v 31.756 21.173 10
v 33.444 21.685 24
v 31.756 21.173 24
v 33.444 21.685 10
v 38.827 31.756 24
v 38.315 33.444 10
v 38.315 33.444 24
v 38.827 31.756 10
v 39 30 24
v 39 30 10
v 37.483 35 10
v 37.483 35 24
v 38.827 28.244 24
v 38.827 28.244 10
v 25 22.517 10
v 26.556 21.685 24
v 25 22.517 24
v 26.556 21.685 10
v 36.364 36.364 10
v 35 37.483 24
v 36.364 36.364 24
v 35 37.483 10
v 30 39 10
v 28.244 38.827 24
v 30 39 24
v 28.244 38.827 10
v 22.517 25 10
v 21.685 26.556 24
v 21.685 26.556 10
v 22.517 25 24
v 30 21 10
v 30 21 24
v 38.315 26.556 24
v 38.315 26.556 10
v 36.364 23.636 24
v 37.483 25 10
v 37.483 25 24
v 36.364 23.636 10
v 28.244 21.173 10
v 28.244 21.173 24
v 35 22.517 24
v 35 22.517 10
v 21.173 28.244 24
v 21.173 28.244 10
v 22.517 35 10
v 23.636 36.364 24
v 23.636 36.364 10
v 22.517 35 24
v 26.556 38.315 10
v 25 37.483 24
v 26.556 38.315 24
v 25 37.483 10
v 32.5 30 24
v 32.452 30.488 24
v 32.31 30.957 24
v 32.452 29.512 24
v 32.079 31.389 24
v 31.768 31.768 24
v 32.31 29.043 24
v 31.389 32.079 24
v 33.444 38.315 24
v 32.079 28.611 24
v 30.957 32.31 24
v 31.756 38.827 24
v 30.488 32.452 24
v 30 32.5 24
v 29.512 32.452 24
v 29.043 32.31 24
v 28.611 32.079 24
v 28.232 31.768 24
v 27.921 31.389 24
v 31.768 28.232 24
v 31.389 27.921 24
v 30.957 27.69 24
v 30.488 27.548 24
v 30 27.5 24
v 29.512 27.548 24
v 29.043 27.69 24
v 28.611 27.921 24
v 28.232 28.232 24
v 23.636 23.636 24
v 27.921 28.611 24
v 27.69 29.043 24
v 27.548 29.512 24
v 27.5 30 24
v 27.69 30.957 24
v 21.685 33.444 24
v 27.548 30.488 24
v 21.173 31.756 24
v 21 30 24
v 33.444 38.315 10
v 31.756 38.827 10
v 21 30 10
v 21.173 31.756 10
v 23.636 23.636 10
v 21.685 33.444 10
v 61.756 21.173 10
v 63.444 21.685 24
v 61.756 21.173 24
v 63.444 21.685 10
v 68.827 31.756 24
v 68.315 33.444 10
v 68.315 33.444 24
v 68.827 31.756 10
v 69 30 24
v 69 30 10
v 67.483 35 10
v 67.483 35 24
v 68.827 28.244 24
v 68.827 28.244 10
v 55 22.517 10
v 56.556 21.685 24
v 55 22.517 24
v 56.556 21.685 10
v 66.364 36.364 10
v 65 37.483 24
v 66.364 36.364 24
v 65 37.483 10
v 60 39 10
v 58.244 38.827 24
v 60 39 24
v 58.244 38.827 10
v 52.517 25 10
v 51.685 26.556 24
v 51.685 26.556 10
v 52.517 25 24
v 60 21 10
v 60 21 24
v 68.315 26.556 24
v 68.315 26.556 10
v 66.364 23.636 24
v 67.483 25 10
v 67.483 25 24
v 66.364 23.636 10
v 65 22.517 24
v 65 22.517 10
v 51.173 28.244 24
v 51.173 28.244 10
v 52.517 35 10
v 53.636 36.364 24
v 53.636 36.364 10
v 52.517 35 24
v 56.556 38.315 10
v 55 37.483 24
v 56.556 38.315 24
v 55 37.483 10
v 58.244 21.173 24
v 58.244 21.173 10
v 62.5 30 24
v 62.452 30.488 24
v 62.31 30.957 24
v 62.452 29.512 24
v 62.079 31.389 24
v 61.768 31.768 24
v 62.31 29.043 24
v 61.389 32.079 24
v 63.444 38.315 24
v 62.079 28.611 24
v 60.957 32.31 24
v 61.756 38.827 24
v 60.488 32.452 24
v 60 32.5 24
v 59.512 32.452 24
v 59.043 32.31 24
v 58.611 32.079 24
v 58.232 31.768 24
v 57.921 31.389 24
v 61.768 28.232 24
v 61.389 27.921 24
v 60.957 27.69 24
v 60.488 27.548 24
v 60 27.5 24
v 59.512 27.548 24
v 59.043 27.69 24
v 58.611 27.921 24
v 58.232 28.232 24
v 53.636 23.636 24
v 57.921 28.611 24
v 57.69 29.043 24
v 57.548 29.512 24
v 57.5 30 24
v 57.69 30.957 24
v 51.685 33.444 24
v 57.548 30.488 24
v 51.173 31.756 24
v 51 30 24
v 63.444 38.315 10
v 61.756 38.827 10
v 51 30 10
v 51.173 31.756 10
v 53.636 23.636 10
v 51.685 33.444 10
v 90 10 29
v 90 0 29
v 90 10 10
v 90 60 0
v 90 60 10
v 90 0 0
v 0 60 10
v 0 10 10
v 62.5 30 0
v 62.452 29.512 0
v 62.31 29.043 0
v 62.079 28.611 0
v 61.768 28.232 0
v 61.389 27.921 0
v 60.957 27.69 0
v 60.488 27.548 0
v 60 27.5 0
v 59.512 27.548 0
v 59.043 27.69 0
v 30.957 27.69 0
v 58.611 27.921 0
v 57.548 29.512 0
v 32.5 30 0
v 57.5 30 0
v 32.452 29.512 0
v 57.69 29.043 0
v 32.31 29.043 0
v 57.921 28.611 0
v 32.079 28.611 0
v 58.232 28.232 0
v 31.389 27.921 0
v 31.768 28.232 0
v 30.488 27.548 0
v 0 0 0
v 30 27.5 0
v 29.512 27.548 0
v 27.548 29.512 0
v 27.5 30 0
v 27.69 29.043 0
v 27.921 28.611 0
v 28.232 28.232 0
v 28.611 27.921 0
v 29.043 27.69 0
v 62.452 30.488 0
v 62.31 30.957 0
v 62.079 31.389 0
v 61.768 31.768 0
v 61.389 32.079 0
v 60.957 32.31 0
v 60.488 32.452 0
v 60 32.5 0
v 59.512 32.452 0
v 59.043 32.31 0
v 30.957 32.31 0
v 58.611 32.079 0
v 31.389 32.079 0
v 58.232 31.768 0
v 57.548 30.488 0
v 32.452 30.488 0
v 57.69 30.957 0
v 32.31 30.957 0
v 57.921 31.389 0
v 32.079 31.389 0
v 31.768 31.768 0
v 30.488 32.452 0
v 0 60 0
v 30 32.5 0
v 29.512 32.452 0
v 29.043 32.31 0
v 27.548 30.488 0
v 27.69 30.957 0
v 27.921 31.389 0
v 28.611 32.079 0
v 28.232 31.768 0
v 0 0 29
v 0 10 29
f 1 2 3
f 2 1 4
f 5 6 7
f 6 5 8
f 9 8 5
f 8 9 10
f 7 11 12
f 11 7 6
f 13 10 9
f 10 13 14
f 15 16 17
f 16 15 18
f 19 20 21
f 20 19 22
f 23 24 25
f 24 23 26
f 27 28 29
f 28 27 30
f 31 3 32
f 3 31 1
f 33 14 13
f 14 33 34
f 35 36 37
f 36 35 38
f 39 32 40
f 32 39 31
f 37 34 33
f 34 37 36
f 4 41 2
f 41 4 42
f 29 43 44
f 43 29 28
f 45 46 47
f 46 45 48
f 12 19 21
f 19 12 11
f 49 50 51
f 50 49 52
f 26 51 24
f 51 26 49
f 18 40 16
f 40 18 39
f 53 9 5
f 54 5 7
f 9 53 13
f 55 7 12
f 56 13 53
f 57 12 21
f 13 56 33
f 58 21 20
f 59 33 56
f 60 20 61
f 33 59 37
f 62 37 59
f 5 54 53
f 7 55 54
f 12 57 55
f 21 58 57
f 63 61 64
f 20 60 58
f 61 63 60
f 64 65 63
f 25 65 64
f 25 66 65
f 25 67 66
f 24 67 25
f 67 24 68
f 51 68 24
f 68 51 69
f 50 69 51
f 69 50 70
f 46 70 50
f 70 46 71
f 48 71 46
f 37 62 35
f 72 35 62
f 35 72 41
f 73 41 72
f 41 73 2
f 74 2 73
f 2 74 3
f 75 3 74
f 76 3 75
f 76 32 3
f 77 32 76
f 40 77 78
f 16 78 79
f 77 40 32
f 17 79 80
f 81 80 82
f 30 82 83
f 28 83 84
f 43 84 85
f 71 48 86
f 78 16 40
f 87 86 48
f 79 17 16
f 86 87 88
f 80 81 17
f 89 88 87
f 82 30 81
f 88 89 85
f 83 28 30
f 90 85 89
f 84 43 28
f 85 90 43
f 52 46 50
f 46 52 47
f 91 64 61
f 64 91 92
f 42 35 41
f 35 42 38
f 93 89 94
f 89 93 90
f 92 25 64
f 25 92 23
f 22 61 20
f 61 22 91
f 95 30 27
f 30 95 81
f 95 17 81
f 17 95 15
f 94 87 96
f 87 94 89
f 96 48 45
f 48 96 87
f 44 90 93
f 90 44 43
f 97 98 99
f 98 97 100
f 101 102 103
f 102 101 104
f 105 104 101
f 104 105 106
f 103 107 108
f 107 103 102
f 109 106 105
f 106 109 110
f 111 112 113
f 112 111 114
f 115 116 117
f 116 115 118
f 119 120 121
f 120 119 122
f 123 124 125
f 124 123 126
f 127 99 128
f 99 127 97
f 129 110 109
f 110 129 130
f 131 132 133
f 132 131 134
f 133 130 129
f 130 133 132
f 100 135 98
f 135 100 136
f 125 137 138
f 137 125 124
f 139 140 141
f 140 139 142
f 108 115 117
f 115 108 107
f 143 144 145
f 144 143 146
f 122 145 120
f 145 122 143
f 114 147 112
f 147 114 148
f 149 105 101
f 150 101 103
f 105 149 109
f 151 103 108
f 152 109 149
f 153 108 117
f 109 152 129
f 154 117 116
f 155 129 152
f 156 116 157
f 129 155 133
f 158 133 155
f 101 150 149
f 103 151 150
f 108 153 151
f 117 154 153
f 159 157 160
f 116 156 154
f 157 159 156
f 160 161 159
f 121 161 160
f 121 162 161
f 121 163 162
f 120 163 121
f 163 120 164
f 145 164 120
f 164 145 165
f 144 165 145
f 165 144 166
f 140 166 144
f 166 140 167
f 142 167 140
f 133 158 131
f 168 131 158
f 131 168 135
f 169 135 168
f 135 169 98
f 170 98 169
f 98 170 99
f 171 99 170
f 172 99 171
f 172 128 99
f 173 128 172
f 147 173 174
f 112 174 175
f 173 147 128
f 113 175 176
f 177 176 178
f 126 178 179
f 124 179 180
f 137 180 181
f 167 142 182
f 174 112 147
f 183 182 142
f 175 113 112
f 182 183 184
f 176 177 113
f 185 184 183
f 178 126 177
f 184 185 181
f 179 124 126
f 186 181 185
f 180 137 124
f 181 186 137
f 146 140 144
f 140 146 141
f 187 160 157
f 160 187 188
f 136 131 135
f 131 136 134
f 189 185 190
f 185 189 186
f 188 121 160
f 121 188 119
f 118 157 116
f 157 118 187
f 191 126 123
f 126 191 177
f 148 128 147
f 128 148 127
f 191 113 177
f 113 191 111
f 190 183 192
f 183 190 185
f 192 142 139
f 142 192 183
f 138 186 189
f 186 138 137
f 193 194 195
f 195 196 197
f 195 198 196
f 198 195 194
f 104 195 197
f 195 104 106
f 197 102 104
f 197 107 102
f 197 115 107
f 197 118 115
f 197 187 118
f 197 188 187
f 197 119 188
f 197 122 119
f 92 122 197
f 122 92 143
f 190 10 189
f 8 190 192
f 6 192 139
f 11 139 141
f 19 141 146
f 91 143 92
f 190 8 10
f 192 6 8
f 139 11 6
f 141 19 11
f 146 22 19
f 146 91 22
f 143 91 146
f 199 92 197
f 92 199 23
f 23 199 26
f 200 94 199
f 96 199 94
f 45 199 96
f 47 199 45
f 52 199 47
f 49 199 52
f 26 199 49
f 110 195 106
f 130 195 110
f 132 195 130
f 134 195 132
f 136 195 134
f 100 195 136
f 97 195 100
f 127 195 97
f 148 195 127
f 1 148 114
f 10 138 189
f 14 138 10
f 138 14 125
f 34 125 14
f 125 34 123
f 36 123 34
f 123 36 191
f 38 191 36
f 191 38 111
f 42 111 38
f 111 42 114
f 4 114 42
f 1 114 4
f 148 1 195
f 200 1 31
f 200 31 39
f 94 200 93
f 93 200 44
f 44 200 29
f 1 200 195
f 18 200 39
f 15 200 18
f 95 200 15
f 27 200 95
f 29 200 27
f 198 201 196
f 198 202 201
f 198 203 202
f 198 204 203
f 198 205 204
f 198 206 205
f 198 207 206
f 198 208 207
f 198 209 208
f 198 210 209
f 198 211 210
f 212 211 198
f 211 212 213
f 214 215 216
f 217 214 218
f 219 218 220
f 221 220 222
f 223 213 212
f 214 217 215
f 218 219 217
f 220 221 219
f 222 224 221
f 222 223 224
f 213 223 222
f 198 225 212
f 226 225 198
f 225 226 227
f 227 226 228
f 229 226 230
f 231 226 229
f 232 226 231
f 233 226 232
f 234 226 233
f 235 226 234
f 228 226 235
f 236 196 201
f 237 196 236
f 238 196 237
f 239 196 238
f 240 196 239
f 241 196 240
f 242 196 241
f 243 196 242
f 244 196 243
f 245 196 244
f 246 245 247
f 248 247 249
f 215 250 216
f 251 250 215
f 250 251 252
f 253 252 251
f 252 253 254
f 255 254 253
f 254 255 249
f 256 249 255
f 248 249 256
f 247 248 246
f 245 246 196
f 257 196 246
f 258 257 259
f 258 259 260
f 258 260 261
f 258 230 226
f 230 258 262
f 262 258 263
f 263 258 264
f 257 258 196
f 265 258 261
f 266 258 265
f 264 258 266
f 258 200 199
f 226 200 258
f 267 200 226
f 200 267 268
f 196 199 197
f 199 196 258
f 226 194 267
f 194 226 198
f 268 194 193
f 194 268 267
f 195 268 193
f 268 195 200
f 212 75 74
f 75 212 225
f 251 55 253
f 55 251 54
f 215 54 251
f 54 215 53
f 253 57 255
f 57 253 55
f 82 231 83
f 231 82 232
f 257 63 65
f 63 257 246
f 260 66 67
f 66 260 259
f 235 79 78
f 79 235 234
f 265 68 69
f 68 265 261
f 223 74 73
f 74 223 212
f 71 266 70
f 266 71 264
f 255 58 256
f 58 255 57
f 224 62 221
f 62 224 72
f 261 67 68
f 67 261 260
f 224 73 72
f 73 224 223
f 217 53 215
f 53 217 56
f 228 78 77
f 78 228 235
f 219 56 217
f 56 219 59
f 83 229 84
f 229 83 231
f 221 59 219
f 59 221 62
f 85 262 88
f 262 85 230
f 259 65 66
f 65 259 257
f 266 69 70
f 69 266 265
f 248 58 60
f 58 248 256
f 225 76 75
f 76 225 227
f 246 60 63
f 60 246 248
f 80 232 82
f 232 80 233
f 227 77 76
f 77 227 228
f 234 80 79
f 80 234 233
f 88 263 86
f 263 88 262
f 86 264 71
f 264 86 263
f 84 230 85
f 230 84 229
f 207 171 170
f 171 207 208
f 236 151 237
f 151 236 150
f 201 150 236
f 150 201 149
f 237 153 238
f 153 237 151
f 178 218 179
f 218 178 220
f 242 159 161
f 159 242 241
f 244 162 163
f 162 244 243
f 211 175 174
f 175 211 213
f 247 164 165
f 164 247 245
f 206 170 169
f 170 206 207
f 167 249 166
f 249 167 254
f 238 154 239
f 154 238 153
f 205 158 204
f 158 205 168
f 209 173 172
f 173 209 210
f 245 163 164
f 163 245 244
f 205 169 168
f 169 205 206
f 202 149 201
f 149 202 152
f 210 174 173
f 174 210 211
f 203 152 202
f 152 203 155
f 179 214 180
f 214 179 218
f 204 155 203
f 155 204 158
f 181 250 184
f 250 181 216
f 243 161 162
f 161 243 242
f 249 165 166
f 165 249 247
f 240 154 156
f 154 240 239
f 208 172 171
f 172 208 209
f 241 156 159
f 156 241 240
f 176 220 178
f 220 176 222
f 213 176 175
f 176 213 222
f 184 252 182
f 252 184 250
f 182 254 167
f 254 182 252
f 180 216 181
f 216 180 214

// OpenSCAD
$fn = 32;

// ----------------------------------------------------------------------
// Drill jig: fence jig
// ----------------------------------------------------------------------

// --- parameters (mm) ---
plate_l = 90;             // plate length, X
plate_w = 60;             // plate width, Y
plate_t = 10;             // plate thickness
boss_d = 18;              // guide boss diameter
boss_h = 15;              // boss height above the plate
guide_d = 5;              // guide hole diameter
boss_pitch = 30;          // boss pitch
fence_h = 20;             // fence height above the plate
fence_t = 10;             // fence thickness

n_boss = 2;  // guide bosses
boss_x0 = (plate_l - (n_boss - 1) * boss_pitch) / 2;  // first boss X
boss_top = plate_t - 1 + boss_h;  // boss crown height
fence_top = plate_t - 1 + fence_h;  // fence crown height
total_h = max([fence_top, boss_top]);  // overall height

difference() {
  union() {
  cube([plate_l, plate_w, plate_t]);
  for (i = [0 : n_boss - 1])
    translate([boss_x0 + i * boss_pitch, plate_w / 2, plate_t - 1])
      cylinder(h = boss_h, d = boss_d);
  translate([0, 0, plate_t - 1]) cube([plate_l, fence_t, fence_h]);
  }
  for (i = [0 : n_boss - 1])
    translate([boss_x0 + i * boss_pitch, plate_w / 2, -1])
      cylinder(h = plate_t + boss_h, d = guide_d);
}
